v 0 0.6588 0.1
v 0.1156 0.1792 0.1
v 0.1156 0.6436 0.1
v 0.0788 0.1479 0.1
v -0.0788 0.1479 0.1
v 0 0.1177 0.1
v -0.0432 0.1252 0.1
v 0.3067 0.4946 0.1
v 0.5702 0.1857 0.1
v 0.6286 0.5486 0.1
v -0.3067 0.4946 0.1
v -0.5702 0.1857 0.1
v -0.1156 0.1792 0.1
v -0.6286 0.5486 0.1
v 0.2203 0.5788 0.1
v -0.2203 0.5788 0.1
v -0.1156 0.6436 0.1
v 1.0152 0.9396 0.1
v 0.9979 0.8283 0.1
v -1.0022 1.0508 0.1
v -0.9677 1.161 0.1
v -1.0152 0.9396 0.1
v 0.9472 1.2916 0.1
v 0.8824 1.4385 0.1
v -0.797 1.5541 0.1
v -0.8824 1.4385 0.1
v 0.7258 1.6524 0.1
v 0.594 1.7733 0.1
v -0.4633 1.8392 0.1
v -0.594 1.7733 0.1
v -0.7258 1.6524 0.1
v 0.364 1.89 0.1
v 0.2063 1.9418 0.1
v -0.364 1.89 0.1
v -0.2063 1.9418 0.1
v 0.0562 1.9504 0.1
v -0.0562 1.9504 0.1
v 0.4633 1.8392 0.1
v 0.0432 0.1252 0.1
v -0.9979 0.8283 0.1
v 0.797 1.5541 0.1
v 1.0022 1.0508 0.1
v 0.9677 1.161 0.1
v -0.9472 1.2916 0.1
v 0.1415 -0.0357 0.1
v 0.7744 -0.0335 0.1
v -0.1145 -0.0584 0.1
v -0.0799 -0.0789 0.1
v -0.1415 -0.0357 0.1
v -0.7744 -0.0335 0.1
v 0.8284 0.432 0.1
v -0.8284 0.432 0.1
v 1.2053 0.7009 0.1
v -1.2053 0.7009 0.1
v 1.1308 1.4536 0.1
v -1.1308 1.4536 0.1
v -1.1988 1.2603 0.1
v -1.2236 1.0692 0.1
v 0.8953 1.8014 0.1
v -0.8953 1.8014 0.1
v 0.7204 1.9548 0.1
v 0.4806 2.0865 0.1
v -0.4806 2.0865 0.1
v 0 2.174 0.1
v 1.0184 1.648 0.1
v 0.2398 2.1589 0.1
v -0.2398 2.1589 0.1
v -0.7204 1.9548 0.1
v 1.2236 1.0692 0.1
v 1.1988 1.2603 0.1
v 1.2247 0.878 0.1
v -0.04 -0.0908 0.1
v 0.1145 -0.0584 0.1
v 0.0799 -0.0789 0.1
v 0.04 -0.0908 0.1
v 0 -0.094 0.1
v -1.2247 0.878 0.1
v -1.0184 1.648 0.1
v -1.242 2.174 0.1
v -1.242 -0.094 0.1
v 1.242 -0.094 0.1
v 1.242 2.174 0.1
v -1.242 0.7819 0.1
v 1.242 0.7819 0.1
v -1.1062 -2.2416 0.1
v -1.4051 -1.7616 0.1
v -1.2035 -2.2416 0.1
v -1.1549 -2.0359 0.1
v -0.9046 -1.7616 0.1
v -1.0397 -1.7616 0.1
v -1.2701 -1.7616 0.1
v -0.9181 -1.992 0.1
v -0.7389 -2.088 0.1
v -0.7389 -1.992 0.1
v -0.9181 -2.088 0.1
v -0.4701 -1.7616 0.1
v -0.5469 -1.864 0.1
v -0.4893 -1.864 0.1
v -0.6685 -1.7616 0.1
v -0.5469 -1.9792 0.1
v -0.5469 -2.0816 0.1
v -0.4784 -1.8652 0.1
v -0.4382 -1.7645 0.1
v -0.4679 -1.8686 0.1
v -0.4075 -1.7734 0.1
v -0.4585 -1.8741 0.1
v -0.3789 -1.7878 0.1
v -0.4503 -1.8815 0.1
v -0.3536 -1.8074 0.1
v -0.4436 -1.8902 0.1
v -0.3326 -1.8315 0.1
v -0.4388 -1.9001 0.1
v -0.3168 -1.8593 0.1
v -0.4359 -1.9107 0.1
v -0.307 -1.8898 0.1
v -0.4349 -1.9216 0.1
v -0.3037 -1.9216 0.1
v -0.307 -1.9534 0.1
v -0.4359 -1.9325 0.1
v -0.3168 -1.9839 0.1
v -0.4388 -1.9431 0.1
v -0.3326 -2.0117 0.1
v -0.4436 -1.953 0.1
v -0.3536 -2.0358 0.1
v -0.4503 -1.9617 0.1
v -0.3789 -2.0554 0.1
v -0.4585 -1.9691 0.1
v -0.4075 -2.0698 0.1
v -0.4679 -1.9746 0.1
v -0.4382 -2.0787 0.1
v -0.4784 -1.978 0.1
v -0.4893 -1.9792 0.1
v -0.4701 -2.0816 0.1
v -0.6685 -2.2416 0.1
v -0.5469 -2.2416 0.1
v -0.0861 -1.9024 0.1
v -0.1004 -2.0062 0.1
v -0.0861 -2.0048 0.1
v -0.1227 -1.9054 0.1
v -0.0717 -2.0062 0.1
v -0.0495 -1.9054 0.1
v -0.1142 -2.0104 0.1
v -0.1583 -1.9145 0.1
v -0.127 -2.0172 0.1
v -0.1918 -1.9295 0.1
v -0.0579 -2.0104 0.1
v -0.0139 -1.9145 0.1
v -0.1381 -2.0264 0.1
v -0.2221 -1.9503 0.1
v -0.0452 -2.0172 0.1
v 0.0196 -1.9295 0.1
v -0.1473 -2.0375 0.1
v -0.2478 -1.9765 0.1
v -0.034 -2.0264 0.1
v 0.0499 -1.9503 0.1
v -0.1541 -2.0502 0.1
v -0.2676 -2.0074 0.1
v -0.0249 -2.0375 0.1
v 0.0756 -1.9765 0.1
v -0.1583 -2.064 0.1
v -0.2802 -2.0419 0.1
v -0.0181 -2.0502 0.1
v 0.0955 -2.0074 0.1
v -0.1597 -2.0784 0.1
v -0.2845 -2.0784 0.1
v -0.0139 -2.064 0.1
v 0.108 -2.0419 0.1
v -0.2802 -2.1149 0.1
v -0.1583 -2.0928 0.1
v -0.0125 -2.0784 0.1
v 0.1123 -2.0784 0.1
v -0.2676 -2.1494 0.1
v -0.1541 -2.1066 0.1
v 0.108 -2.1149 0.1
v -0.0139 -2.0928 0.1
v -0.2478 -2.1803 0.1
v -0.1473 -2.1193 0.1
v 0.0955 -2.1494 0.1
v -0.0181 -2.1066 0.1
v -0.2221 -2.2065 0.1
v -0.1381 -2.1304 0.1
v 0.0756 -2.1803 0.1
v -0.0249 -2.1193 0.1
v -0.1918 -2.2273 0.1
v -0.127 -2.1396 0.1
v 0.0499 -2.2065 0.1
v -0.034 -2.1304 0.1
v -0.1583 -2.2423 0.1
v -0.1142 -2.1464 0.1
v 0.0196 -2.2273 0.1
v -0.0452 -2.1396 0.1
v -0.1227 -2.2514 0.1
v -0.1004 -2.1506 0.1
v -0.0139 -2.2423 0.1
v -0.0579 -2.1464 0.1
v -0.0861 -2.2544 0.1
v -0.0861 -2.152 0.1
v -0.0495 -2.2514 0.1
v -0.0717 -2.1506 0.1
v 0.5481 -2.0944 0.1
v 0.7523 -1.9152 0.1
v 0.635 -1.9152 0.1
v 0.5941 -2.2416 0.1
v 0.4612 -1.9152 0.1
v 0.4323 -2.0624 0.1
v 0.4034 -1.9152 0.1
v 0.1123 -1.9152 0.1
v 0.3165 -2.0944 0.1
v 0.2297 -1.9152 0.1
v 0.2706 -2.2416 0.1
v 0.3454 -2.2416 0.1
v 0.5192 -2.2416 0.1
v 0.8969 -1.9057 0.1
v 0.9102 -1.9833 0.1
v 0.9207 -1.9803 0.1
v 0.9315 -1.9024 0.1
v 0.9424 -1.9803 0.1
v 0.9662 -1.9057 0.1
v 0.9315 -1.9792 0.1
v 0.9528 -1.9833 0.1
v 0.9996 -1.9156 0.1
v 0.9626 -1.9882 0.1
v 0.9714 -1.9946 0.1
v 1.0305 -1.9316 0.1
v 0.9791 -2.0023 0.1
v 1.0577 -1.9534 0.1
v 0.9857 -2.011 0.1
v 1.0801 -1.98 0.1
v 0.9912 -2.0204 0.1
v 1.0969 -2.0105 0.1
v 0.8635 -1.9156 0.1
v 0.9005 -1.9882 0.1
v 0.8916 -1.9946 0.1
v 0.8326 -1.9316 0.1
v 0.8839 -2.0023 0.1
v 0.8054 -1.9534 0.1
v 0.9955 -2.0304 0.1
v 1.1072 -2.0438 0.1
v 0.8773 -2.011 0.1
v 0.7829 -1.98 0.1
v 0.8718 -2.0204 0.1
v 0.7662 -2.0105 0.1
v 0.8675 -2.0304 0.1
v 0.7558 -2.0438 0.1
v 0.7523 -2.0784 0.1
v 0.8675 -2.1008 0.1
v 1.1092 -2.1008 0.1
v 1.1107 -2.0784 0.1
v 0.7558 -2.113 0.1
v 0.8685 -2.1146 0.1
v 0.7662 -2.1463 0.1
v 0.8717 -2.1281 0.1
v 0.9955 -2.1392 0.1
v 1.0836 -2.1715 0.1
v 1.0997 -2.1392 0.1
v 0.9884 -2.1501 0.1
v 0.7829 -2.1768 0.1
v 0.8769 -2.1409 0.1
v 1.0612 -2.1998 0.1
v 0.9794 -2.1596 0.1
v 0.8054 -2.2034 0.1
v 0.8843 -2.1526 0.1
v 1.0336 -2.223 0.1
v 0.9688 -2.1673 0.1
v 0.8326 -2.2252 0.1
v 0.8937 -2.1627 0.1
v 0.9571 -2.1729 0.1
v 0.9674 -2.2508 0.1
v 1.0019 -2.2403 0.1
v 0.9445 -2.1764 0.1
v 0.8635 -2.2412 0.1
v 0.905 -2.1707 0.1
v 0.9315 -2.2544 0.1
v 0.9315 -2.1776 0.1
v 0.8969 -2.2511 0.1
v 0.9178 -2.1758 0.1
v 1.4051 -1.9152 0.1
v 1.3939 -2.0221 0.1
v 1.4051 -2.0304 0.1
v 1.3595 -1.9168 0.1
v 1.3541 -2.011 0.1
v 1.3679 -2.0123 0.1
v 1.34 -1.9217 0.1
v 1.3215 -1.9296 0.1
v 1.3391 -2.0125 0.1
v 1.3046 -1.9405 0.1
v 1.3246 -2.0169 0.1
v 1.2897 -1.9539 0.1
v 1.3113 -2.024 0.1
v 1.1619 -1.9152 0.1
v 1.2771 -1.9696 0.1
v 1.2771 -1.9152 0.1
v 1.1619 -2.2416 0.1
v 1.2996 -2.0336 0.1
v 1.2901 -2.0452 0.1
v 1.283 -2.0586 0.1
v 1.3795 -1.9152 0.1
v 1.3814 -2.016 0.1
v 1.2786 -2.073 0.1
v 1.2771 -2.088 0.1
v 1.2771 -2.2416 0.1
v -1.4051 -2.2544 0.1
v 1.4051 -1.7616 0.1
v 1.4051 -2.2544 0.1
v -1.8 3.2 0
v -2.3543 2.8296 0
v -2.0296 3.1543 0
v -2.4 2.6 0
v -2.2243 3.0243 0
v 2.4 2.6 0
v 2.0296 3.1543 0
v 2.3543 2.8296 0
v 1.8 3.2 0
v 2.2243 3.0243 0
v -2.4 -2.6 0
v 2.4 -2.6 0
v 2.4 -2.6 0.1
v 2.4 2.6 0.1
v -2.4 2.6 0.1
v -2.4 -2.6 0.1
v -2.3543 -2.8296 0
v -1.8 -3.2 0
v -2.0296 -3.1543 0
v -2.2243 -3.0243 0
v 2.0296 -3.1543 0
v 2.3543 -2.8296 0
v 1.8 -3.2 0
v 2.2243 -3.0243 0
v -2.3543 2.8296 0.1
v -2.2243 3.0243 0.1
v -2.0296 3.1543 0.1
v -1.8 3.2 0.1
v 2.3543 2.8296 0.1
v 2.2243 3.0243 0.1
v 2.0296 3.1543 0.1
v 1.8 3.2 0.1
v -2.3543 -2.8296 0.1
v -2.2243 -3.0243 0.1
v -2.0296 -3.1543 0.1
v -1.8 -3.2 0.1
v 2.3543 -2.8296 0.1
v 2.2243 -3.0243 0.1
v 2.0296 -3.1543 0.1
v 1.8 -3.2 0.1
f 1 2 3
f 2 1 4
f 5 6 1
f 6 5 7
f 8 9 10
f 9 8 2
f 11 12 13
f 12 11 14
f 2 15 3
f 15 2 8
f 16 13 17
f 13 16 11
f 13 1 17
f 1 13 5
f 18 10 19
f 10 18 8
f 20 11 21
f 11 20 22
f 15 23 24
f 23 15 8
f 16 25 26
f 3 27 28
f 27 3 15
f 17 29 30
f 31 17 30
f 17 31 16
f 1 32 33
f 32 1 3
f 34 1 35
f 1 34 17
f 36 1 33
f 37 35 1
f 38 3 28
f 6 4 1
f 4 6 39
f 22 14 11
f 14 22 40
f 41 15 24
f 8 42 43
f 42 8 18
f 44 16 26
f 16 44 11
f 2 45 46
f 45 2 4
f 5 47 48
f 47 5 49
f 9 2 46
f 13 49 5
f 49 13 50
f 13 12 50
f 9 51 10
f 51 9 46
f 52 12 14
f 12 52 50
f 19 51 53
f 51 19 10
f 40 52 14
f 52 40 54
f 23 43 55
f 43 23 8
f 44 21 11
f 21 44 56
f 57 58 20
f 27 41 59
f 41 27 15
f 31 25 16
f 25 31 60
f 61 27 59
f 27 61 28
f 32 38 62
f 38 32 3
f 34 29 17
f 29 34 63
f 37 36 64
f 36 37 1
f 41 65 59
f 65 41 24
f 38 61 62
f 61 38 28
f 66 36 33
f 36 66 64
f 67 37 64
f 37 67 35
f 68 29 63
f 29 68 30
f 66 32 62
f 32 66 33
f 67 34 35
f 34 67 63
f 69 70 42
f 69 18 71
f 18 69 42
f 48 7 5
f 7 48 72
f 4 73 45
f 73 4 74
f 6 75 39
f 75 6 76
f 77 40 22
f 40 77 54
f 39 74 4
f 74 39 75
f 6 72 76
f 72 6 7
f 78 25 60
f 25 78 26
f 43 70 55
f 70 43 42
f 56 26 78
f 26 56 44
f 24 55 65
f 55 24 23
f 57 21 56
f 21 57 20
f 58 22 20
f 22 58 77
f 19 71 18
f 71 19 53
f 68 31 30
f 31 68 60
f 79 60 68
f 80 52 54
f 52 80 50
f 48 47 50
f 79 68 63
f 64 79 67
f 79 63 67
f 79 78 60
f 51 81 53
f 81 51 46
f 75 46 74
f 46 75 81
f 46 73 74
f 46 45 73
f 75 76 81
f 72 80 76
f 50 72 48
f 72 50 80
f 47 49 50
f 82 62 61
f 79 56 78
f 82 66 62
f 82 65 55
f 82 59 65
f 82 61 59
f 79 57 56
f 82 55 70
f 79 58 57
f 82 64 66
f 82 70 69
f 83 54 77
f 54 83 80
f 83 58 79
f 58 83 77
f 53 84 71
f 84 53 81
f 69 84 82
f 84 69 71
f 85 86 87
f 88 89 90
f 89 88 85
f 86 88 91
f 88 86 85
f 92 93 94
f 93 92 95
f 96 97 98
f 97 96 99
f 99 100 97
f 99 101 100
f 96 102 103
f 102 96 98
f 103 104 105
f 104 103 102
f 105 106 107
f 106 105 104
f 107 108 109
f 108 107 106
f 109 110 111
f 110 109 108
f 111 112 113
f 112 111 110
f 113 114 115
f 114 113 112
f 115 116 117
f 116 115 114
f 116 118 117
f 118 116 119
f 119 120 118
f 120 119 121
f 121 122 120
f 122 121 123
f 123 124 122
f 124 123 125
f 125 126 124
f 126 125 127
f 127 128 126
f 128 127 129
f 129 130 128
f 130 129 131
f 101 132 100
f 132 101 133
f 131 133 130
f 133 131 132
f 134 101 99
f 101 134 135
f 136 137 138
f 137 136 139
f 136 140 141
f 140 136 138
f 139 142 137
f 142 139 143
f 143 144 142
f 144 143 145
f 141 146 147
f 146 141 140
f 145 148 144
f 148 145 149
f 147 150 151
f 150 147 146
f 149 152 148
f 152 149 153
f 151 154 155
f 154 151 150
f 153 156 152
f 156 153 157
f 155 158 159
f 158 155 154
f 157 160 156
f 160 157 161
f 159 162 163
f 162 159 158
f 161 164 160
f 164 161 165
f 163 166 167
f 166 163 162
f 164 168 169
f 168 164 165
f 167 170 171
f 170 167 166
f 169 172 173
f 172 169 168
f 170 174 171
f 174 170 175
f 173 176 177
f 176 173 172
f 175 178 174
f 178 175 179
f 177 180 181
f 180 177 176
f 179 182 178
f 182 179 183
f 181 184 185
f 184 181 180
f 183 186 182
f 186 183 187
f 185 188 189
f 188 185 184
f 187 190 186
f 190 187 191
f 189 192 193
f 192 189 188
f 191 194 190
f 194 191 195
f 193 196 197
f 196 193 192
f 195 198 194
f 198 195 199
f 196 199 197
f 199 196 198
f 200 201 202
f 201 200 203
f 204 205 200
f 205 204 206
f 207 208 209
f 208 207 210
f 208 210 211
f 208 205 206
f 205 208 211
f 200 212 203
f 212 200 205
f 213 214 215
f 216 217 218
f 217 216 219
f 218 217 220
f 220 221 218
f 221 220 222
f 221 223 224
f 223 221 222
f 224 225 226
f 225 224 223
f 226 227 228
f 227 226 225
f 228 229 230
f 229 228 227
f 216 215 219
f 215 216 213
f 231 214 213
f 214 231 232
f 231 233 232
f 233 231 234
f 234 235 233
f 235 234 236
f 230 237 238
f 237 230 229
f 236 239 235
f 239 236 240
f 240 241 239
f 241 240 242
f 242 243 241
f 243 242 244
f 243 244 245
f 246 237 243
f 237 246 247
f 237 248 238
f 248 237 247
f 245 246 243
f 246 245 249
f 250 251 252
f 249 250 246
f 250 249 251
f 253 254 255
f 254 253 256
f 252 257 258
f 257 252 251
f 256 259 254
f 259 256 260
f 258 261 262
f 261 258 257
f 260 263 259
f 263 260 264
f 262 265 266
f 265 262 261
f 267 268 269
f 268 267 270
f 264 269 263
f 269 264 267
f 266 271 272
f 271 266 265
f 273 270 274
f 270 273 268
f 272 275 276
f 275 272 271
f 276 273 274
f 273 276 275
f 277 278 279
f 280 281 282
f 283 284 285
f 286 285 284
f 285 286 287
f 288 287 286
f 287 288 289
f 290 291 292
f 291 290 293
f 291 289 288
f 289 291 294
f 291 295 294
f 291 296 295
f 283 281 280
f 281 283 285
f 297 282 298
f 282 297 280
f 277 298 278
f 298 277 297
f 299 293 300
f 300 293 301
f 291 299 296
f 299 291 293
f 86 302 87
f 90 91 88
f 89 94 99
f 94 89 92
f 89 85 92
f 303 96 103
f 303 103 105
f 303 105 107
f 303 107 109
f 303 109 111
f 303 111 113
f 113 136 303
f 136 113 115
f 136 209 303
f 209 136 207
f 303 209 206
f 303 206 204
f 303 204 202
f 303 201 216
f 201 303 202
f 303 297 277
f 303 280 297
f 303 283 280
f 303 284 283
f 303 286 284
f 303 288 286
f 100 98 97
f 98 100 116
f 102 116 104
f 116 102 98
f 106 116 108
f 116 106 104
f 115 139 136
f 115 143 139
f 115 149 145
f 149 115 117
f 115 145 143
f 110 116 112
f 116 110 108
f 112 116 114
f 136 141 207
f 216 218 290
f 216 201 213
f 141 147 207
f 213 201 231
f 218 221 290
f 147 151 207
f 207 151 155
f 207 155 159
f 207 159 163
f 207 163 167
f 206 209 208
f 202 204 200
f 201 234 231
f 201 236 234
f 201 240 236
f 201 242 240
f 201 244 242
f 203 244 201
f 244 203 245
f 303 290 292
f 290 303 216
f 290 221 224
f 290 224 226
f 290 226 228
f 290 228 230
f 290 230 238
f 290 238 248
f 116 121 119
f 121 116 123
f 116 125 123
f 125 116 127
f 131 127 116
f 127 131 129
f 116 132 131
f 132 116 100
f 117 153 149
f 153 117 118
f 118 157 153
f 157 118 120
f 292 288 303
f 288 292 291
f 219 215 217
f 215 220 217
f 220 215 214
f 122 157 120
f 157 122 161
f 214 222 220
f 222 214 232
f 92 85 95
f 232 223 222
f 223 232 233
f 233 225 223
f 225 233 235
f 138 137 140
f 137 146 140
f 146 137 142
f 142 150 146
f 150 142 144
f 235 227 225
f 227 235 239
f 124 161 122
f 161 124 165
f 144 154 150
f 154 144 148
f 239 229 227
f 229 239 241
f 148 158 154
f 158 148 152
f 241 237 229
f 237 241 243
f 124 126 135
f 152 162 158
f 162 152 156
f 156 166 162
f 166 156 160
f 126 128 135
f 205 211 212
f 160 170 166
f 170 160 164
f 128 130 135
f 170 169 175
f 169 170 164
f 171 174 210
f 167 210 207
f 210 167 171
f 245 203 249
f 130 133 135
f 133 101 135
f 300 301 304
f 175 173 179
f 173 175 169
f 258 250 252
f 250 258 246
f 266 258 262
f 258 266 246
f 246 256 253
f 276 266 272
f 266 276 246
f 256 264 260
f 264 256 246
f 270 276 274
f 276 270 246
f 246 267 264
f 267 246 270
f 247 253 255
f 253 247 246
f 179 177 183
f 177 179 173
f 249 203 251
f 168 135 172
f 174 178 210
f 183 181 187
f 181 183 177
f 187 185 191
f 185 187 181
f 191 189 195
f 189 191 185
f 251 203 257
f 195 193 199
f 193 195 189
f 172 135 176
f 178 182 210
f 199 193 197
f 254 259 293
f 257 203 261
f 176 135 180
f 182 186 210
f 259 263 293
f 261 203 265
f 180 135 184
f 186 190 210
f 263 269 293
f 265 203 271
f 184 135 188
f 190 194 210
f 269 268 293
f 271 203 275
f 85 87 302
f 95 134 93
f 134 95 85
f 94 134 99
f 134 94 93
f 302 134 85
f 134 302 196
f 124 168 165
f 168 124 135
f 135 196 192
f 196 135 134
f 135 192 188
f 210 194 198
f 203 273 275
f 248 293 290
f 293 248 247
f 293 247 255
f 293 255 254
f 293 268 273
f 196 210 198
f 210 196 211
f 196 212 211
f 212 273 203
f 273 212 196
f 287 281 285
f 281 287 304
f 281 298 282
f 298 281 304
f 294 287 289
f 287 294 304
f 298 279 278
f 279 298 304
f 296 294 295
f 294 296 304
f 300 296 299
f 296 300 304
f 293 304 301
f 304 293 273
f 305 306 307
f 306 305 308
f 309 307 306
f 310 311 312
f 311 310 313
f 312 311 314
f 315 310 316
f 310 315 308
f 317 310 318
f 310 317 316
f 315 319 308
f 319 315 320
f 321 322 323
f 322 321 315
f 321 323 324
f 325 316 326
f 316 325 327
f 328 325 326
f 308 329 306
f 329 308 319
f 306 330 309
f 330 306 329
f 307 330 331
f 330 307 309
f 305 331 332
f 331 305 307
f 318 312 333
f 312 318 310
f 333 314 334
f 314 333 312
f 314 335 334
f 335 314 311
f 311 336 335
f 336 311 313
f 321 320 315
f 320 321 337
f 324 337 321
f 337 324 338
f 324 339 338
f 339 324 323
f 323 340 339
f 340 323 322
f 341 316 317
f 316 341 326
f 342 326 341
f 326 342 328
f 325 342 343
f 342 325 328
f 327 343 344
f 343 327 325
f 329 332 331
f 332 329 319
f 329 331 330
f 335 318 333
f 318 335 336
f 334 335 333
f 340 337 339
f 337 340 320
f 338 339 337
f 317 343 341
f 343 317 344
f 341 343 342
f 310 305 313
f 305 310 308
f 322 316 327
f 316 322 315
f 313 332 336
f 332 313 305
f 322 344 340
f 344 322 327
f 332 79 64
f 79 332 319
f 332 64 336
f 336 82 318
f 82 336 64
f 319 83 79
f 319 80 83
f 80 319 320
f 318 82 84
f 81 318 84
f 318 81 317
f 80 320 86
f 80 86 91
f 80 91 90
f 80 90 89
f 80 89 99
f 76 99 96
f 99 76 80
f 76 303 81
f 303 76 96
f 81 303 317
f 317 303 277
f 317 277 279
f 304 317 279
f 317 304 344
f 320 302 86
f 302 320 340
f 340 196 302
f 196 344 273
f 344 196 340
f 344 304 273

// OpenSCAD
use <../lib.scad>
use <../p/1-4chrd.scad>
use <../p/1-4cyli.scad>
use <../p/box3u12.scad>
use <../p/logo-shell-1971-outerbox.scad>
use <../p/logo-shell-1971.scad>
use <../p/logo-shell-vpower-text-box.scad>
use <../p/logo-shell-vpower-text.scad>
function ldraw_lib__6177954k() = [
// 0 Sticker  0.8 x  0.6 with Shell Logo on White Background
// 0 Name: 6177954k.dat
// 0 Author: Massimo Maso [Sirio]
// 0 !LDRAW_ORG Part UPDATE 2023-05
// 0 !LICENSE Licensed under CC BY 4.0 : see CAreadme.txt
// 
// 0 BFC CERTIFY CCW
  [0,"BFC","CERTIFY"],
  [0,"BFC","CCW"],
// 
// 0 !KEYWORDS Ferrari, Scuderia, Set 75879, SF16-H, Speed Champions
// 
// 0 !HISTORY 2023-10-31 [OrionP] Official Update 2023-05
// 
// 0 // Logo primitive
// 1 15 0 -.25 2.6 .27 0 0 0 1 0 0 0 .27 logo-shell-1971.dat
  [1,15,0,-.25,2.6,.27,0,0,0,1,0,0,0,.27, ldraw_lib__logo_shell_1971()],
// 1 15 0 -.25 2.6 .27 0 0 0 1 0 0 0 .27 logo-shell-1971-outerbox.dat
  [1,15,0,-.25,2.6,.27,0,0,0,1,0,0,0,.27, ldraw_lib__logo_shell_1971_outerbox()],
// 1 0 0 -.25 -5.02 .8 0 0 0 1 0 0 0 .8 logo-shell-vpower-text.dat
  [1,0,0,-.25,-5.02,.8,0,0,0,1,0,0,0,.8, ldraw_lib__logo_shell_vpower_text()],
// 1 15 0 -.25 -5.02 .8 0 0 0 1 0 0 0 .8 logo-shell-vpower-text-box.dat
  [1,15,0,-.25,-5.02,.8,0,0,0,1,0,0,0,.8, ldraw_lib__logo_shell_vpower_text_box()],
// 0 // Primitives
// 1 16 -4.5 0 6.5 -1.5 0 0 0 -1 0 0 0 1.5 1-4chrd.dat
  [1,16,-4.5,0,6.5,-1.5,0,0,0,-1,0,0,0,1.5, ldraw_lib__1_4chrd()],
// 1 16 4.5 0 6.5 1.5 0 0 0 -1 0 0 0 1.5 1-4chrd.dat
  [1,16,4.5,0,6.5,1.5,0,0,0,-1,0,0,0,1.5, ldraw_lib__1_4chrd()],
// 1 16 0 -.25 0 0 0 6 0 .25 0 6.5 0 0 box3u12.dat
  [1,16,0,-.25,0,0,0,6,0,.25,0,6.5,0,0, ldraw_lib__box3u12()],
// 1 16 -4.5 0 -6.5 -1.5 0 0 0 -1 0 0 0 -1.5 1-4chrd.dat
  [1,16,-4.5,0,-6.5,-1.5,0,0,0,-1,0,0,0,-1.5, ldraw_lib__1_4chrd()],
// 1 16 4.5 0 -6.5 1.5 0 0 0 -1 0 0 0 -1.5 1-4chrd.dat
  [1,16,4.5,0,-6.5,1.5,0,0,0,-1,0,0,0,-1.5, ldraw_lib__1_4chrd()],
// 1 16 -4.5 0 6.5 -1.5 0 0 0 -.25 0 0 0 1.5 1-4cyli.dat
  [1,16,-4.5,0,6.5,-1.5,0,0,0,-.25,0,0,0,1.5, ldraw_lib__1_4cyli()],
// 1 16 4.5 0 6.5 1.5 0 0 0 -.25 0 0 0 1.5 1-4cyli.dat
  [1,16,4.5,0,6.5,1.5,0,0,0,-.25,0,0,0,1.5, ldraw_lib__1_4cyli()],
// 1 16 -4.5 0 -6.5 -1.5 0 0 0 -.25 0 0 0 -1.5 1-4cyli.dat
  [1,16,-4.5,0,-6.5,-1.5,0,0,0,-.25,0,0,0,-1.5, ldraw_lib__1_4cyli()],
// 1 16 4.5 0 -6.5 1.5 0 0 0 -.25 0 0 0 -1.5 1-4cyli.dat
  [1,16,4.5,0,-6.5,1.5,0,0,0,-.25,0,0,0,-1.5, ldraw_lib__1_4cyli()],
// 1 15 -4.5 -.25 6.5 -1.5 0 0 0 1 0 0 0 1.5 1-4chrd.dat
  [1,15,-4.5,-.25,6.5,-1.5,0,0,0,1,0,0,0,1.5, ldraw_lib__1_4chrd()],
// 1 15 4.5 -.25 6.5 1.5 0 0 0 1 0 0 0 1.5 1-4chrd.dat
  [1,15,4.5,-.25,6.5,1.5,0,0,0,1,0,0,0,1.5, ldraw_lib__1_4chrd()],
// 1 15 -4.5 -.25 -6.5 -1.5 0 0 0 1 0 0 0 -1.5 1-4chrd.dat
  [1,15,-4.5,-.25,-6.5,-1.5,0,0,0,1,0,0,0,-1.5, ldraw_lib__1_4chrd()],
// 1 15 4.5 -.25 -6.5 1.5 0 0 0 1 0 0 0 -1.5 1-4chrd.dat
  [1,15,4.5,-.25,-6.5,1.5,0,0,0,1,0,0,0,-1.5, ldraw_lib__1_4chrd()],
// 0 // Bottom face
// 4 16 4.5 0 8 6 0 6.5 -6 0 6.5 -4.5 0 8
  [4,16,4.5,0,8,6,0,6.5,-6,0,6.5,-4.5,0,8],
// 4 16 4.5 0 -8 -4.5 0 -8 -6 0 -6.5 6 0 -6.5
  [4,16,4.5,0,-8,-4.5,0,-8,-6,0,-6.5,6,0,-6.5],
// 0 // Lateral face
// 4 16 -4.5 0 8 -4.5 -.25 8 4.5 -.25 8 4.5 0 8
  [4,16,-4.5,0,8,-4.5,-.25,8,4.5,-.25,8,4.5,0,8],
// 4 16 -4.5 0 -8 4.5 0 -8 4.5 -.25 -8 -4.5 -.25 -8
  [4,16,-4.5,0,-8,4.5,0,-8,4.5,-.25,-8,-4.5,-.25,-8],
// 0 // Top face
// 0 // White faces
// 4 15 -4.5 -.25 8 -6 -.25 6.5 -3.105 -.25 5.435 0 -.25 5.435
  [4,15,-4.5,-.25,8,-6,-.25,6.5,-3.105,-.25,5.435,0,-.25,5.435],
// 3 15 -4.5 -.25 8 0 -.25 5.435 4.5 -.25 8
  [3,15,-4.5,-.25,8,0,-.25,5.435,4.5,-.25,8],
// 4 15 4.5 -.25 8 0 -.25 5.435 3.105 -.25 5.435 6 -.25 6.5
  [4,15,4.5,-.25,8,0,-.25,5.435,3.105,-.25,5.435,6,-.25,6.5],
// 3 15 -6 -.25 6.5 -3.105 -.25 1.9547 -3.105 -.25 5.435
  [3,15,-6,-.25,6.5,-3.105,-.25,1.9547,-3.105,-.25,5.435],
// 4 15 -6 -.25 6.5 -6 -.25 -6.5 -3.105 -.25 -.235 -3.105 -.25 1.9547
  [4,15,-6,-.25,6.5,-6,-.25,-6.5,-3.105,-.25,-.235,-3.105,-.25,1.9547],
// 3 15 6 -.25 6.5 3.105 -.25 5.435 3.105 -.25 1.9547
  [3,15,6,-.25,6.5,3.105,-.25,5.435,3.105,-.25,1.9547],
// 4 15 6 -.25 6.5 3.105 -.25 1.9547 3.105 -.25 -.235 6 -.25 -6.5
  [4,15,6,-.25,6.5,3.105,-.25,1.9547,3.105,-.25,-.235,6,-.25,-6.5],
// 3 15 -3.105 -.25 -.235 -6 -.25 -6.5 -3.5128 -.25 -4.404
  [3,15,-3.105,-.25,-.235,-6,-.25,-6.5,-3.5128,-.25,-4.404],
// 3 15 -3.105 -.25 -.235 -3.5128 -.25 -4.404 -3.1752 -.25 -4.404
  [3,15,-3.105,-.25,-.235,-3.5128,-.25,-4.404,-3.1752,-.25,-4.404],
// 3 15 -3.105 -.25 -.235 -3.1752 -.25 -4.404 -2.5992 -.25 -4.404
  [3,15,-3.105,-.25,-.235,-3.1752,-.25,-4.404,-2.5992,-.25,-4.404],
// 3 15 -3.105 -.25 -.235 -2.5992 -.25 -4.404 -2.2616 -.25 -4.404
  [3,15,-3.105,-.25,-.235,-2.5992,-.25,-4.404,-2.2616,-.25,-4.404],
// 3 15 -3.105 -.25 -.235 -2.2616 -.25 -4.404 -1.6712 -.25 -4.404
  [3,15,-3.105,-.25,-.235,-2.2616,-.25,-4.404,-1.6712,-.25,-4.404],
// 4 15 -3.105 -.25 -.235 -1.6712 -.25 -4.404 -1.1752 -.25 -4.404 0 -.25 -.235
  [4,15,-3.105,-.25,-.235,-1.6712,-.25,-4.404,-1.1752,-.25,-4.404,0,-.25,-.235],
// 4 15 3.105 -.25 -.235 0 -.25 -.235 -1.1752 -.25 -4.404 3.5128 -.25 -4.404
  [4,15,3.105,-.25,-.235,0,-.25,-.235,-1.1752,-.25,-4.404,3.5128,-.25,-4.404],
// 3 15 3.105 -.25 -.235 3.5128 -.25 -4.404 6 -.25 -6.5
  [3,15,3.105,-.25,-.235,3.5128,-.25,-4.404,6,-.25,-6.5],
// 3 15 6 -.25 -6.5 3.5128 -.25 -4.404 3.5128 -.25 -4.788
  [3,15,6,-.25,-6.5,3.5128,-.25,-4.404,3.5128,-.25,-4.788],
// 3 15 6 -.25 -6.5 3.5128 -.25 -4.788 3.5128 -.25 -5.076
  [3,15,6,-.25,-6.5,3.5128,-.25,-4.788,3.5128,-.25,-5.076],
// 4 15 6 -.25 -6.5 3.5128 -.25 -5.076 3.5128 -.25 -5.636 4.5 -.25 -8
  [4,15,6,-.25,-6.5,3.5128,-.25,-5.076,3.5128,-.25,-5.636,4.5,-.25,-8],
// 4 15 -4.5 -.25 -8 -3.5128 -.25 -5.636 -3.5128 -.25 -4.404 -6 -.25 -6.5
  [4,15,-4.5,-.25,-8,-3.5128,-.25,-5.636,-3.5128,-.25,-4.404,-6,-.25,-6.5],
// 3 15 -4.5 -.25 -8 -.2152 -.25 -5.636 -3.5128 -.25 -5.636
  [3,15,-4.5,-.25,-8,-.2152,-.25,-5.636,-3.5128,-.25,-5.636],
// 4 15 -4.5 -.25 -8 4.5 -.25 -8 2.3288 -.25 -5.636 -.2152 -.25 -5.636
  [4,15,-4.5,-.25,-8,4.5,-.25,-8,2.3288,-.25,-5.636,-.2152,-.25,-5.636],
// 3 15 4.5 -.25 -8 3.5128 -.25 -5.636 2.3288 -.25 -5.636
  [3,15,4.5,-.25,-8,3.5128,-.25,-5.636,2.3288,-.25,-5.636],
];
module ldraw_lib__6177954k(step=0, col=false, unit=2/5, alt=false, line=0.2, solid=!$preview)
    makepoly(ldraw_lib__6177954k(), step=step, col=col, unit=unit, alt=alt, line=line, solid=solid);
ldraw_lib__6177954k(line=0.2);
